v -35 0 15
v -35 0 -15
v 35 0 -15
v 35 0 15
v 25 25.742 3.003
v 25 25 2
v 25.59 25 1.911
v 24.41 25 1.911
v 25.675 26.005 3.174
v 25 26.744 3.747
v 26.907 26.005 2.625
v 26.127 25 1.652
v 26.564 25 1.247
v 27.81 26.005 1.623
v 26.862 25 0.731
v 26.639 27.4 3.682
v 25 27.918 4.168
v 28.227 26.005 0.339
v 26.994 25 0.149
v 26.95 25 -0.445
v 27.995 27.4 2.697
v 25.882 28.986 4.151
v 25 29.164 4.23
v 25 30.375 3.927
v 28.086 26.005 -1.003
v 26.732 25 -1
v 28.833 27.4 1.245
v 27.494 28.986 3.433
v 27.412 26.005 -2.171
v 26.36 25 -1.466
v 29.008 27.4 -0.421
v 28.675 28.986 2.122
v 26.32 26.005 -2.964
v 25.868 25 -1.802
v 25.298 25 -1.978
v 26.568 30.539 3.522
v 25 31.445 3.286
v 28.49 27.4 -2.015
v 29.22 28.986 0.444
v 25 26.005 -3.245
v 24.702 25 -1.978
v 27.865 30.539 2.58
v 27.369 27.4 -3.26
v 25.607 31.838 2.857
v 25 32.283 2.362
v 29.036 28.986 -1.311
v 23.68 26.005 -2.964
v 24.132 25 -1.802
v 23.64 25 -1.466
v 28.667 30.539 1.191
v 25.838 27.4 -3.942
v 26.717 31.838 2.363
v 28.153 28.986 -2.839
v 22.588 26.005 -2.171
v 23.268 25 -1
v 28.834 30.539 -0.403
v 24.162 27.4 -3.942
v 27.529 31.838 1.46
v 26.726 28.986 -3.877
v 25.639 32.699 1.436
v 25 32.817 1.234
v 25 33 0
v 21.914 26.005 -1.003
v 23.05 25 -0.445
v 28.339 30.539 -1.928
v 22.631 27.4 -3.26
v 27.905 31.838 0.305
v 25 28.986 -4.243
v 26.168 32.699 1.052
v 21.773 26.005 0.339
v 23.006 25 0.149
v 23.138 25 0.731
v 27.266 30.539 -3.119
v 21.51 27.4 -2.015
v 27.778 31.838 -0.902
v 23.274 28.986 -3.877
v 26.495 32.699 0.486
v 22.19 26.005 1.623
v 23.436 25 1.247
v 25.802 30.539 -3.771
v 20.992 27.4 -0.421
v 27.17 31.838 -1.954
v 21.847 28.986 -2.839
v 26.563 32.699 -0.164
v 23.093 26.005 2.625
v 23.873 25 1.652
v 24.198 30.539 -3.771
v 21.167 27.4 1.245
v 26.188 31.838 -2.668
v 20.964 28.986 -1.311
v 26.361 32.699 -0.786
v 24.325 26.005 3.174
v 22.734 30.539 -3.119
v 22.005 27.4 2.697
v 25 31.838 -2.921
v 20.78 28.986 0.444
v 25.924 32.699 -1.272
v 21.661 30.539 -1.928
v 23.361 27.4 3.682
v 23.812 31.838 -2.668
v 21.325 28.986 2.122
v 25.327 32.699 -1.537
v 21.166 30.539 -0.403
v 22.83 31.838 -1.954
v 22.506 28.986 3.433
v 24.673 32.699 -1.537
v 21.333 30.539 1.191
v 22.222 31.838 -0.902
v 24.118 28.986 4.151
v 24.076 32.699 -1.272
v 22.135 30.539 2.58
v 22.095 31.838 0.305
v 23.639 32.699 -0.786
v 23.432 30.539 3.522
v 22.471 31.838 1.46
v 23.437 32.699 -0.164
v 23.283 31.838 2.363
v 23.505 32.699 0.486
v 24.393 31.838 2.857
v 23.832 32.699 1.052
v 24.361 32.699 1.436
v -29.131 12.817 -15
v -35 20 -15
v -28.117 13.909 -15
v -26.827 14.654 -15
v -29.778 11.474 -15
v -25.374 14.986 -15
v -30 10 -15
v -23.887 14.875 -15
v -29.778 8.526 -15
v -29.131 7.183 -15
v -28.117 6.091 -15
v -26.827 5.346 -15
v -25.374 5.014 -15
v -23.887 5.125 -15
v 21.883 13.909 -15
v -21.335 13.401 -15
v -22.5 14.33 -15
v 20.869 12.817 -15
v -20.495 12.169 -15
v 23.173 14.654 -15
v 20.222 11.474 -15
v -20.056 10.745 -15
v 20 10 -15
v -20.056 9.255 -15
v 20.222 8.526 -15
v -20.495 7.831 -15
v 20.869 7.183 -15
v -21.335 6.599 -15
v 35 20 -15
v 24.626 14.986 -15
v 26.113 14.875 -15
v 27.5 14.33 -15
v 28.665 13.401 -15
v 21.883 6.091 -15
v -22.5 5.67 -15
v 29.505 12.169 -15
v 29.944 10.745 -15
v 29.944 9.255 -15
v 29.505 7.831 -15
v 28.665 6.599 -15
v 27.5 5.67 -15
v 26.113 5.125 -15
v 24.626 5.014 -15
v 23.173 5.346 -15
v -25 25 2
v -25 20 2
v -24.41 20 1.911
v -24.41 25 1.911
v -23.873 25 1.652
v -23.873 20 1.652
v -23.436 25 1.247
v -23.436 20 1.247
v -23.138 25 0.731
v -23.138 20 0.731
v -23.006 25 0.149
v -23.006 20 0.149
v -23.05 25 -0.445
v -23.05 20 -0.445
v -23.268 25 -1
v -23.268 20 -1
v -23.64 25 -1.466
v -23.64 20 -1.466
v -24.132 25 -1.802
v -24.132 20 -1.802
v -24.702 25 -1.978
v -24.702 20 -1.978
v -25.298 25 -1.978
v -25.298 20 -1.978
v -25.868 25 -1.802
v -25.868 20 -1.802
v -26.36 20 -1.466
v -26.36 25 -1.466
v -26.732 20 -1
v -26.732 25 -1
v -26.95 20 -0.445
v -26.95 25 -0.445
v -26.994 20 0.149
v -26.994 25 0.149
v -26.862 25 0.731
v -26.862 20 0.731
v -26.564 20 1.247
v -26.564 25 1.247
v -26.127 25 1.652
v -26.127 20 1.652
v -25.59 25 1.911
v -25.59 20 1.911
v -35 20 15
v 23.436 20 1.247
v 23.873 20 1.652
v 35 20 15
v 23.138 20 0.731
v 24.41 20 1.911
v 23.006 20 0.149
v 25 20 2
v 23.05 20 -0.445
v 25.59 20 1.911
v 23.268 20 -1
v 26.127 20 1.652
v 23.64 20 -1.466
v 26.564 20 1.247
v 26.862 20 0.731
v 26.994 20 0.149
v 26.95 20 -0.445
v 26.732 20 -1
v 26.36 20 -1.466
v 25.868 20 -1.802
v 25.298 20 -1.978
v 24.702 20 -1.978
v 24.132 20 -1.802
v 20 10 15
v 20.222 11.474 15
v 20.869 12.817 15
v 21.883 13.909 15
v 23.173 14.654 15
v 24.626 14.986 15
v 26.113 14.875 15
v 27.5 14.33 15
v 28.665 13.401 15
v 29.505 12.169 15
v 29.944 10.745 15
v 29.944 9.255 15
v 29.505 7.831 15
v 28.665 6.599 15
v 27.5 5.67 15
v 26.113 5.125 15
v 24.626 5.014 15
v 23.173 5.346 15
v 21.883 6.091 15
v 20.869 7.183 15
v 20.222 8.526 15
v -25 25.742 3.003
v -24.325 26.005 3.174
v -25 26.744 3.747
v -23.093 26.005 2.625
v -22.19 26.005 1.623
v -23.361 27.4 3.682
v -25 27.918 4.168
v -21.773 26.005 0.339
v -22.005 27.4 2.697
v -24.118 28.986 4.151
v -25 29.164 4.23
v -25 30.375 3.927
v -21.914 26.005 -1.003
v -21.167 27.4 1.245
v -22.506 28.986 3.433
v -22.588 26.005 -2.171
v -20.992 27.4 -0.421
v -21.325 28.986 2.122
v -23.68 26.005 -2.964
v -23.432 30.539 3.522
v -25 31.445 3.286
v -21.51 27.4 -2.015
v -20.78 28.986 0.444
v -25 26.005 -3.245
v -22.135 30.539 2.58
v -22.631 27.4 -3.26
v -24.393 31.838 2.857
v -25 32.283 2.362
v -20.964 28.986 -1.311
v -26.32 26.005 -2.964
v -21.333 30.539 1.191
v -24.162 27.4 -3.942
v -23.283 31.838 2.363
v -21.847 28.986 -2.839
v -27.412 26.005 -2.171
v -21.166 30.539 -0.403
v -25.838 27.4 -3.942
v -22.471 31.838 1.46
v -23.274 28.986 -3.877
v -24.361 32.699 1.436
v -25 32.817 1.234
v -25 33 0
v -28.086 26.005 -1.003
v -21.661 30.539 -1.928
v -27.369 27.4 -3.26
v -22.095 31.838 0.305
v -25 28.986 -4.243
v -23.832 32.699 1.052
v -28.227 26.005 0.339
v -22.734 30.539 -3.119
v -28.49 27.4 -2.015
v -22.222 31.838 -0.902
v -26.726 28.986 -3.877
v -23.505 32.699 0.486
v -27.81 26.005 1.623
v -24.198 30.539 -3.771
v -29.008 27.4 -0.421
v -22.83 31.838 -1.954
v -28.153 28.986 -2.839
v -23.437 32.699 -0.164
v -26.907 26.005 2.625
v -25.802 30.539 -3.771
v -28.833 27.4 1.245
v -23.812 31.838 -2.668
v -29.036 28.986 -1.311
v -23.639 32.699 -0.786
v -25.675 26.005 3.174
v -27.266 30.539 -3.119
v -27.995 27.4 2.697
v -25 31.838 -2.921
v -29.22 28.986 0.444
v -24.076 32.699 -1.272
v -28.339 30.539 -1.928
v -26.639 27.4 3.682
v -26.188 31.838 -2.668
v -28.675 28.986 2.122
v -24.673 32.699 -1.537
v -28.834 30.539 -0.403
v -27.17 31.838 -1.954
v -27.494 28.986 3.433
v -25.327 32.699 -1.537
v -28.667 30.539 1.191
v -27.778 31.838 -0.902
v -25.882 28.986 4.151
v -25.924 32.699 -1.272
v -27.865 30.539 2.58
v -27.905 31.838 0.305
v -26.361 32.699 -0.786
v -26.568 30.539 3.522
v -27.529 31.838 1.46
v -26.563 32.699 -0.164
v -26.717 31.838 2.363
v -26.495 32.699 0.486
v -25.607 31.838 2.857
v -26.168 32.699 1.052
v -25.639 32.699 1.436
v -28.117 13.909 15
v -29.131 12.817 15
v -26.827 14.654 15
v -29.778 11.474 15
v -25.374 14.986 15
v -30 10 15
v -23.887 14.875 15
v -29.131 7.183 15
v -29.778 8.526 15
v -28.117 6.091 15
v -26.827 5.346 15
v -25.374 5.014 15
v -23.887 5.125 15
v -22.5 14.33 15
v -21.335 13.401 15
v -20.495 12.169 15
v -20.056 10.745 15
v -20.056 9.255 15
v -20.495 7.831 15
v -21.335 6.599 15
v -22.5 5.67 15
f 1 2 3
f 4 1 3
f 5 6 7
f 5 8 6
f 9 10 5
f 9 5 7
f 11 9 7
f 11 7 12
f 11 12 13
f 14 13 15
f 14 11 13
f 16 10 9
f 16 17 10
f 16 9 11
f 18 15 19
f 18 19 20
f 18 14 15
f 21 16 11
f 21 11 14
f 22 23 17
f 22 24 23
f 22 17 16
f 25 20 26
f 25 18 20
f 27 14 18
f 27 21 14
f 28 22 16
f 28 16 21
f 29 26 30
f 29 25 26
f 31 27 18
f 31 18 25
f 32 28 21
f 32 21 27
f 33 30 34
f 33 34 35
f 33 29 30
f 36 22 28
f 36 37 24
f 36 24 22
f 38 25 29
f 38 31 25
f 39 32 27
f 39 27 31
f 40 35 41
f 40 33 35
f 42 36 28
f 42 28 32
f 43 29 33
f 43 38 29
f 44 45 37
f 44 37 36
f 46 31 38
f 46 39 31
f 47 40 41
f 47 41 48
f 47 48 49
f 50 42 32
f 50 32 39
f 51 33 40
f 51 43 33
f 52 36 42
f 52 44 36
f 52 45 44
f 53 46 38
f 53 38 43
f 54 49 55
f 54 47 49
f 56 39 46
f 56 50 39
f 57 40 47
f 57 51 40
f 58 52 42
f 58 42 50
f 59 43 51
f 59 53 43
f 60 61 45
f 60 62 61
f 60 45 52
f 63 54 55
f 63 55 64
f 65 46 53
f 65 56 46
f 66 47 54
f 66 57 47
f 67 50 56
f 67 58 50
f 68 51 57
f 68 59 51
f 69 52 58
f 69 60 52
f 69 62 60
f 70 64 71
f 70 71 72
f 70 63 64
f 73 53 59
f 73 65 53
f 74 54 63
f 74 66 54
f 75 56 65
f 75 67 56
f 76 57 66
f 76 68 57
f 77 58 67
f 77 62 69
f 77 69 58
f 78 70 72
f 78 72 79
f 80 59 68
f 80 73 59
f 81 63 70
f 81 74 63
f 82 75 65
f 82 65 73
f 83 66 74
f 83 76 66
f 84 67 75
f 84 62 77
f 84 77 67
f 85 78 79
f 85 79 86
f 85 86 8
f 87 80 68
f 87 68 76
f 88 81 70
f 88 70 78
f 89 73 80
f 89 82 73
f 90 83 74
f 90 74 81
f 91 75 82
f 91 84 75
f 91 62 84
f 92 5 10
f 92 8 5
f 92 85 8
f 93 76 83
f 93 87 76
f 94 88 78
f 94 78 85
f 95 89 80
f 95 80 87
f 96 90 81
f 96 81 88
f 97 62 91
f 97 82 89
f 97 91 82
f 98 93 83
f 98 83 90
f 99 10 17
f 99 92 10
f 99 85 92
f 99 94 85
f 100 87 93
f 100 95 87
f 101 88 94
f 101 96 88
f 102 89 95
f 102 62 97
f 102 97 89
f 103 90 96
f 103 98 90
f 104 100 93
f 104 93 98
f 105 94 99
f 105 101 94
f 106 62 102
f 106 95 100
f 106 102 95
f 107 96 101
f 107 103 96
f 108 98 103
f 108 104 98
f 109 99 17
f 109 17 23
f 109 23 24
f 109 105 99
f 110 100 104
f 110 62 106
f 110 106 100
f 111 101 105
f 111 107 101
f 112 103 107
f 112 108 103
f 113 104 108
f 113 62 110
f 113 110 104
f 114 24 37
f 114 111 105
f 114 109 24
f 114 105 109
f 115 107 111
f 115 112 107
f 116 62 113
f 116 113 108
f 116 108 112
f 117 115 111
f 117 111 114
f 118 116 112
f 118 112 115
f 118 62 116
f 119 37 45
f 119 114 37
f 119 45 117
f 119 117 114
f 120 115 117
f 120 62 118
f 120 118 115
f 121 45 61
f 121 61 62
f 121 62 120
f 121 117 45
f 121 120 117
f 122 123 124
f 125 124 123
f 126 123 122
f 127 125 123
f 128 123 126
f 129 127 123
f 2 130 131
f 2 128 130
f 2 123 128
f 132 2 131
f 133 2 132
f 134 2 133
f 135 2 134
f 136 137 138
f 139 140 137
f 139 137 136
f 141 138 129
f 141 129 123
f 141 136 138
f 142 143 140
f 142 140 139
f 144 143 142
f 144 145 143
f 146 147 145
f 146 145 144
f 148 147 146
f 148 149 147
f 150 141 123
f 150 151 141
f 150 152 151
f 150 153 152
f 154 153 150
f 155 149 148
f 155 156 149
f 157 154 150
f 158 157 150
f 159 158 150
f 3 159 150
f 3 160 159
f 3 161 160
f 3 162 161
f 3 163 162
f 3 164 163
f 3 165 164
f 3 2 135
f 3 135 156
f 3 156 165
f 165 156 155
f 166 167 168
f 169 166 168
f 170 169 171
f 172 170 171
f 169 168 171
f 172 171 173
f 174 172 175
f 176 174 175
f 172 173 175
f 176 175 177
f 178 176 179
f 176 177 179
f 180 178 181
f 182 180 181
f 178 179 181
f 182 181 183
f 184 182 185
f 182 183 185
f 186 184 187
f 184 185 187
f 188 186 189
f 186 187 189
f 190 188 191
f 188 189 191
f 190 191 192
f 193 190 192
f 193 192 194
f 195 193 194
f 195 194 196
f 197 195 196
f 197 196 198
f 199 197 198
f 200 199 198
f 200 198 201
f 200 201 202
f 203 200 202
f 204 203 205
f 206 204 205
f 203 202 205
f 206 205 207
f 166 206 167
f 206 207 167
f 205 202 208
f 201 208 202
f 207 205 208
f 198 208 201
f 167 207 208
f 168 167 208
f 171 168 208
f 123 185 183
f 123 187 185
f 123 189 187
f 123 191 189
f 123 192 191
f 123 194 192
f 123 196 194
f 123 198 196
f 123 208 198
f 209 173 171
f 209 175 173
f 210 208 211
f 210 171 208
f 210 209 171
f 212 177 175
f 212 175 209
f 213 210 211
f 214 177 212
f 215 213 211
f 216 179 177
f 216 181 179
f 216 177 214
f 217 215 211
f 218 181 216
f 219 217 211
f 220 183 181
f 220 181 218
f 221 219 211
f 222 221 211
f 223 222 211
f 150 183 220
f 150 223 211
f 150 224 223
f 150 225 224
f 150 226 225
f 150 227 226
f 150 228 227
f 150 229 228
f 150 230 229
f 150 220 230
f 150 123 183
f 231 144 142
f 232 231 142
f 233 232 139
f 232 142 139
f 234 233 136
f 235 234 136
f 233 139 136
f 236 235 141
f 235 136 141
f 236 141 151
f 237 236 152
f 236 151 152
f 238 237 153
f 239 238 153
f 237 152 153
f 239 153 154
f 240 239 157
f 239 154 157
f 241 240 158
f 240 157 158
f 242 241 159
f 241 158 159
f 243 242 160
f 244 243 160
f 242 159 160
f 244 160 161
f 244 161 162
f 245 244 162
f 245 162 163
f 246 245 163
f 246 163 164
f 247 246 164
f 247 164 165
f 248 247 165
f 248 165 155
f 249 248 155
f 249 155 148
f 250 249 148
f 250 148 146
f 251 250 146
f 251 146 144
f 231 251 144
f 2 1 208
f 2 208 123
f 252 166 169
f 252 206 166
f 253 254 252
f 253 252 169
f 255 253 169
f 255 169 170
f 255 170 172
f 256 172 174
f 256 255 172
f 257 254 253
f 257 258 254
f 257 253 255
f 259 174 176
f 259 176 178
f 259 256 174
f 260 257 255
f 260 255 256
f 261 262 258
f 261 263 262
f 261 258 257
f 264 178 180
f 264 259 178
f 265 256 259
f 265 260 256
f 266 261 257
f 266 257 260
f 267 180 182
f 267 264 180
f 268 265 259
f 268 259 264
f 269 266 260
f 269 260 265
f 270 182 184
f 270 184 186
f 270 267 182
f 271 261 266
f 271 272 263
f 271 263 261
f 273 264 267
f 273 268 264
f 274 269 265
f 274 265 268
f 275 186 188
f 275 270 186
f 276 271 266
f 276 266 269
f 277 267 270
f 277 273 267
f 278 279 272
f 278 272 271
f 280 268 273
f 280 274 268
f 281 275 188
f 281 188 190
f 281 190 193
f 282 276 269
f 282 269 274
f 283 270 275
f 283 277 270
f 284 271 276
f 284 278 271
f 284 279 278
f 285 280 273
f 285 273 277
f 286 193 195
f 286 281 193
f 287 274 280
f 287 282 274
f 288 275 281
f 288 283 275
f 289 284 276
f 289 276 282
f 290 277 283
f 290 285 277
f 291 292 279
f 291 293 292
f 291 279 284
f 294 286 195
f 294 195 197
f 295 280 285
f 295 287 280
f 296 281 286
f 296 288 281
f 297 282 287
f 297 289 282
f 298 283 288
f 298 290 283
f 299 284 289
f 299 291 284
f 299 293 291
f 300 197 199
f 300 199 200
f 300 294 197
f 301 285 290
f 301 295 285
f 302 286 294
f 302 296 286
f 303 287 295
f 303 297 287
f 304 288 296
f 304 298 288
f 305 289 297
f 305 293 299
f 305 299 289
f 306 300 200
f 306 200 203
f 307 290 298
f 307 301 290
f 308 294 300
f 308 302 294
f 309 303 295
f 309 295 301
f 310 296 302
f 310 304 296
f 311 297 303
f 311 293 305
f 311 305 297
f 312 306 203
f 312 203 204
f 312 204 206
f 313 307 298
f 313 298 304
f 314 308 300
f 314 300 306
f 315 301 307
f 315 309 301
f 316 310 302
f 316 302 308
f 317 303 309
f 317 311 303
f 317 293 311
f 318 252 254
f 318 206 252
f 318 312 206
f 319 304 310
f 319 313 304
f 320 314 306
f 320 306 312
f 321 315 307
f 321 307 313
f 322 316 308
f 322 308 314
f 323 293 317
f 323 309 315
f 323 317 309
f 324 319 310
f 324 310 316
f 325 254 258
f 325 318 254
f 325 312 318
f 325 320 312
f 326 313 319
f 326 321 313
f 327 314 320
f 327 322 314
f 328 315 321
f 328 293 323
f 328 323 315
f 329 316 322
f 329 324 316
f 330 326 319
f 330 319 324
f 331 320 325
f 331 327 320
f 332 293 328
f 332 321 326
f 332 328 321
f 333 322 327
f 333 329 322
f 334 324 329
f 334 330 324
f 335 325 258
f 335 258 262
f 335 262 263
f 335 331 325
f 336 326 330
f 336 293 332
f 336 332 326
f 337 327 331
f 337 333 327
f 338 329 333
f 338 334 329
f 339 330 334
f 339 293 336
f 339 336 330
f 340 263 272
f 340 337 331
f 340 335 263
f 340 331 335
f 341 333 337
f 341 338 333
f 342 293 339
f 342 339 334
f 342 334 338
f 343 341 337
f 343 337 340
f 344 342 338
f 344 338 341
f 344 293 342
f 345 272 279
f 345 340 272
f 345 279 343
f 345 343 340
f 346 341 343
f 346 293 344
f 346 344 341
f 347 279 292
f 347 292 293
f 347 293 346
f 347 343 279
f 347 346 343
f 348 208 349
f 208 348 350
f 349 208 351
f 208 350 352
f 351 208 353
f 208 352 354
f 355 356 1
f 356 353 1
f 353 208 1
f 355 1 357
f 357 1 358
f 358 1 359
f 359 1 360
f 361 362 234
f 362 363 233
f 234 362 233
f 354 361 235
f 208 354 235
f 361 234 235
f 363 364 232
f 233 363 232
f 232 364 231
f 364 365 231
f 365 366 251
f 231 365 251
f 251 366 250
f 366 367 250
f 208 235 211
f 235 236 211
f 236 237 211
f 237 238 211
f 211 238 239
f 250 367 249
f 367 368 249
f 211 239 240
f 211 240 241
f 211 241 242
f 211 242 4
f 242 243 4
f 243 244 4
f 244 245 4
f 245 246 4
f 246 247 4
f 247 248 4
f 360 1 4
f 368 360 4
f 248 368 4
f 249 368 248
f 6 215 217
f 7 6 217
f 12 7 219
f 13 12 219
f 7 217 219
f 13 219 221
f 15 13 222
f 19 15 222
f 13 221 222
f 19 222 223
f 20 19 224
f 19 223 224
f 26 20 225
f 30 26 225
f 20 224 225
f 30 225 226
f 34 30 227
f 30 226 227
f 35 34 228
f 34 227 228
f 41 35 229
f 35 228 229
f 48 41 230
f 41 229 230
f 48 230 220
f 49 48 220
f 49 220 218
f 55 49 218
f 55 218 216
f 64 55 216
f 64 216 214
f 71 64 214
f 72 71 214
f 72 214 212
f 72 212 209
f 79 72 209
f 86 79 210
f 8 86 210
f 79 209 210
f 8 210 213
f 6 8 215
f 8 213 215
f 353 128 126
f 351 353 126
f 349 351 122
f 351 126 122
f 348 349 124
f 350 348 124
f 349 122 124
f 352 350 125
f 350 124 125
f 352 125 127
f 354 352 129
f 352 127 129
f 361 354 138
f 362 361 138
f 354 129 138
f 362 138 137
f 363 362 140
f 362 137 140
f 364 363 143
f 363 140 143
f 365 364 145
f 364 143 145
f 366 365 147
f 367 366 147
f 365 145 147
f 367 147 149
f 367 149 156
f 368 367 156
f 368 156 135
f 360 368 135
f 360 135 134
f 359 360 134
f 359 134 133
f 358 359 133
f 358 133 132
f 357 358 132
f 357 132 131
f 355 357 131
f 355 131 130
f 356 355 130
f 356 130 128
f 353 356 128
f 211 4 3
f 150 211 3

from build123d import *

# Parameters (mm, degrees)
SKETCH1_W           = 70
SKETCH1_H           = 30
BOSS_EXTRUDE1_DEPTH = 20
CUT_EXTRUDE1_REACH  = 52.249
SKETCH2_R           = 5
SKETCH3_R           = 2
BOSS_EXTRUDE2_DEPTH = 5
DOME1_FACE_RADIUS   = 2
DOME1_HEIGHT        = 8
DOME2_FACE_RADIUS   = 2
DOME2_HEIGHT        = 8


with BuildPart() as part:
    # Sketch1 → Boss-Extrude1 (new body)
    with BuildSketch(Plane(origin=(0, 0, 0), x_dir=(1, 0, 0), z_dir=(0, 1, 0))):
        Rectangle(SKETCH1_W, SKETCH1_H)
    extrude(amount=BOSS_EXTRUDE1_DEPTH)

    # Sketch2 → Cut-Extrude1 (cut, up to next)
    with BuildSketch(Plane(origin=(0, 0, -15), x_dir=(-1, 0, 0), z_dir=(0, 0, -1)), mode=Mode.PRIVATE) as cut_extrude1_sk1:
        with Locations((-25, 10)):
            Circle(SKETCH2_R)
    cut_extrude1_tool1 = extrude(cut_extrude1_sk1.sketch, amount=-CUT_EXTRUDE1_REACH, mode=Mode.PRIVATE) & part.part
    # Sketch2 → Cut-Extrude1 (cut, up to next)
    with BuildSketch(Plane(origin=(0, 0, -15), x_dir=(-1, 0, 0), z_dir=(0, 0, -1)), mode=Mode.PRIVATE) as cut_extrude1_sk2:
        with Locations((25, 10)):
            Circle(SKETCH2_R)
    cut_extrude1_tool2 = extrude(cut_extrude1_sk2.sketch, amount=-CUT_EXTRUDE1_REACH, mode=Mode.PRIVATE) & part.part
    add(cut_extrude1_tool1.solids().sort_by_distance((25, 10, -15))[0], mode=Mode.SUBTRACT)
    add(cut_extrude1_tool2.solids().sort_by_distance((-25, 10, -15))[0], mode=Mode.SUBTRACT)

    # Sketch3 → Boss-Extrude2 (add)
    with BuildSketch(Plane(origin=(0, 20, 0), x_dir=(1, 0, 0), z_dir=(0, 1, 0))):
        with Locations(Location((-25, 0, 0), (0, 0, 270))):
            Circle(SKETCH3_R)
        with Locations(Location((25, 0, 0), (0, 0, 270))):
            Circle(SKETCH3_R)
    extrude(amount=BOSS_EXTRUDE2_DEPTH)

    # Dome1: a dome of height H over a round flat face of radius A is a cap of a sphere of radius (A * A + H * H) / (2 * H)
    dome1_r = (DOME1_FACE_RADIUS * DOME1_FACE_RADIUS + DOME1_HEIGHT * DOME1_HEIGHT) / (2 * DOME1_HEIGHT)
    dome1_base = Plane((-25, 25, 0), z_dir=(0, 1, 0))
    with Locations(dome1_base.offset(DOME1_HEIGHT - dome1_r)):
        dome1_ball = Sphere(dome1_r, mode=Mode.PRIVATE)
    add(split(dome1_ball, bisect_by=dome1_base, keep=Keep.TOP, mode=Mode.PRIVATE))

    # Dome2: a dome of height H over a round flat face of radius A is a cap of a sphere of radius (A * A + H * H) / (2 * H)
    dome2_r = (DOME2_FACE_RADIUS * DOME2_FACE_RADIUS + DOME2_HEIGHT * DOME2_HEIGHT) / (2 * DOME2_HEIGHT)
    dome2_base = Plane((25, 25, 0), z_dir=(0, 1, 0))
    with Locations(dome2_base.offset(DOME2_HEIGHT - dome2_r)):
        dome2_ball = Sphere(dome2_r, mode=Mode.PRIVATE)
    add(split(dome2_ball, bisect_by=dome2_base, keep=Keep.TOP, mode=Mode.PRIVATE))


solid = part.part
